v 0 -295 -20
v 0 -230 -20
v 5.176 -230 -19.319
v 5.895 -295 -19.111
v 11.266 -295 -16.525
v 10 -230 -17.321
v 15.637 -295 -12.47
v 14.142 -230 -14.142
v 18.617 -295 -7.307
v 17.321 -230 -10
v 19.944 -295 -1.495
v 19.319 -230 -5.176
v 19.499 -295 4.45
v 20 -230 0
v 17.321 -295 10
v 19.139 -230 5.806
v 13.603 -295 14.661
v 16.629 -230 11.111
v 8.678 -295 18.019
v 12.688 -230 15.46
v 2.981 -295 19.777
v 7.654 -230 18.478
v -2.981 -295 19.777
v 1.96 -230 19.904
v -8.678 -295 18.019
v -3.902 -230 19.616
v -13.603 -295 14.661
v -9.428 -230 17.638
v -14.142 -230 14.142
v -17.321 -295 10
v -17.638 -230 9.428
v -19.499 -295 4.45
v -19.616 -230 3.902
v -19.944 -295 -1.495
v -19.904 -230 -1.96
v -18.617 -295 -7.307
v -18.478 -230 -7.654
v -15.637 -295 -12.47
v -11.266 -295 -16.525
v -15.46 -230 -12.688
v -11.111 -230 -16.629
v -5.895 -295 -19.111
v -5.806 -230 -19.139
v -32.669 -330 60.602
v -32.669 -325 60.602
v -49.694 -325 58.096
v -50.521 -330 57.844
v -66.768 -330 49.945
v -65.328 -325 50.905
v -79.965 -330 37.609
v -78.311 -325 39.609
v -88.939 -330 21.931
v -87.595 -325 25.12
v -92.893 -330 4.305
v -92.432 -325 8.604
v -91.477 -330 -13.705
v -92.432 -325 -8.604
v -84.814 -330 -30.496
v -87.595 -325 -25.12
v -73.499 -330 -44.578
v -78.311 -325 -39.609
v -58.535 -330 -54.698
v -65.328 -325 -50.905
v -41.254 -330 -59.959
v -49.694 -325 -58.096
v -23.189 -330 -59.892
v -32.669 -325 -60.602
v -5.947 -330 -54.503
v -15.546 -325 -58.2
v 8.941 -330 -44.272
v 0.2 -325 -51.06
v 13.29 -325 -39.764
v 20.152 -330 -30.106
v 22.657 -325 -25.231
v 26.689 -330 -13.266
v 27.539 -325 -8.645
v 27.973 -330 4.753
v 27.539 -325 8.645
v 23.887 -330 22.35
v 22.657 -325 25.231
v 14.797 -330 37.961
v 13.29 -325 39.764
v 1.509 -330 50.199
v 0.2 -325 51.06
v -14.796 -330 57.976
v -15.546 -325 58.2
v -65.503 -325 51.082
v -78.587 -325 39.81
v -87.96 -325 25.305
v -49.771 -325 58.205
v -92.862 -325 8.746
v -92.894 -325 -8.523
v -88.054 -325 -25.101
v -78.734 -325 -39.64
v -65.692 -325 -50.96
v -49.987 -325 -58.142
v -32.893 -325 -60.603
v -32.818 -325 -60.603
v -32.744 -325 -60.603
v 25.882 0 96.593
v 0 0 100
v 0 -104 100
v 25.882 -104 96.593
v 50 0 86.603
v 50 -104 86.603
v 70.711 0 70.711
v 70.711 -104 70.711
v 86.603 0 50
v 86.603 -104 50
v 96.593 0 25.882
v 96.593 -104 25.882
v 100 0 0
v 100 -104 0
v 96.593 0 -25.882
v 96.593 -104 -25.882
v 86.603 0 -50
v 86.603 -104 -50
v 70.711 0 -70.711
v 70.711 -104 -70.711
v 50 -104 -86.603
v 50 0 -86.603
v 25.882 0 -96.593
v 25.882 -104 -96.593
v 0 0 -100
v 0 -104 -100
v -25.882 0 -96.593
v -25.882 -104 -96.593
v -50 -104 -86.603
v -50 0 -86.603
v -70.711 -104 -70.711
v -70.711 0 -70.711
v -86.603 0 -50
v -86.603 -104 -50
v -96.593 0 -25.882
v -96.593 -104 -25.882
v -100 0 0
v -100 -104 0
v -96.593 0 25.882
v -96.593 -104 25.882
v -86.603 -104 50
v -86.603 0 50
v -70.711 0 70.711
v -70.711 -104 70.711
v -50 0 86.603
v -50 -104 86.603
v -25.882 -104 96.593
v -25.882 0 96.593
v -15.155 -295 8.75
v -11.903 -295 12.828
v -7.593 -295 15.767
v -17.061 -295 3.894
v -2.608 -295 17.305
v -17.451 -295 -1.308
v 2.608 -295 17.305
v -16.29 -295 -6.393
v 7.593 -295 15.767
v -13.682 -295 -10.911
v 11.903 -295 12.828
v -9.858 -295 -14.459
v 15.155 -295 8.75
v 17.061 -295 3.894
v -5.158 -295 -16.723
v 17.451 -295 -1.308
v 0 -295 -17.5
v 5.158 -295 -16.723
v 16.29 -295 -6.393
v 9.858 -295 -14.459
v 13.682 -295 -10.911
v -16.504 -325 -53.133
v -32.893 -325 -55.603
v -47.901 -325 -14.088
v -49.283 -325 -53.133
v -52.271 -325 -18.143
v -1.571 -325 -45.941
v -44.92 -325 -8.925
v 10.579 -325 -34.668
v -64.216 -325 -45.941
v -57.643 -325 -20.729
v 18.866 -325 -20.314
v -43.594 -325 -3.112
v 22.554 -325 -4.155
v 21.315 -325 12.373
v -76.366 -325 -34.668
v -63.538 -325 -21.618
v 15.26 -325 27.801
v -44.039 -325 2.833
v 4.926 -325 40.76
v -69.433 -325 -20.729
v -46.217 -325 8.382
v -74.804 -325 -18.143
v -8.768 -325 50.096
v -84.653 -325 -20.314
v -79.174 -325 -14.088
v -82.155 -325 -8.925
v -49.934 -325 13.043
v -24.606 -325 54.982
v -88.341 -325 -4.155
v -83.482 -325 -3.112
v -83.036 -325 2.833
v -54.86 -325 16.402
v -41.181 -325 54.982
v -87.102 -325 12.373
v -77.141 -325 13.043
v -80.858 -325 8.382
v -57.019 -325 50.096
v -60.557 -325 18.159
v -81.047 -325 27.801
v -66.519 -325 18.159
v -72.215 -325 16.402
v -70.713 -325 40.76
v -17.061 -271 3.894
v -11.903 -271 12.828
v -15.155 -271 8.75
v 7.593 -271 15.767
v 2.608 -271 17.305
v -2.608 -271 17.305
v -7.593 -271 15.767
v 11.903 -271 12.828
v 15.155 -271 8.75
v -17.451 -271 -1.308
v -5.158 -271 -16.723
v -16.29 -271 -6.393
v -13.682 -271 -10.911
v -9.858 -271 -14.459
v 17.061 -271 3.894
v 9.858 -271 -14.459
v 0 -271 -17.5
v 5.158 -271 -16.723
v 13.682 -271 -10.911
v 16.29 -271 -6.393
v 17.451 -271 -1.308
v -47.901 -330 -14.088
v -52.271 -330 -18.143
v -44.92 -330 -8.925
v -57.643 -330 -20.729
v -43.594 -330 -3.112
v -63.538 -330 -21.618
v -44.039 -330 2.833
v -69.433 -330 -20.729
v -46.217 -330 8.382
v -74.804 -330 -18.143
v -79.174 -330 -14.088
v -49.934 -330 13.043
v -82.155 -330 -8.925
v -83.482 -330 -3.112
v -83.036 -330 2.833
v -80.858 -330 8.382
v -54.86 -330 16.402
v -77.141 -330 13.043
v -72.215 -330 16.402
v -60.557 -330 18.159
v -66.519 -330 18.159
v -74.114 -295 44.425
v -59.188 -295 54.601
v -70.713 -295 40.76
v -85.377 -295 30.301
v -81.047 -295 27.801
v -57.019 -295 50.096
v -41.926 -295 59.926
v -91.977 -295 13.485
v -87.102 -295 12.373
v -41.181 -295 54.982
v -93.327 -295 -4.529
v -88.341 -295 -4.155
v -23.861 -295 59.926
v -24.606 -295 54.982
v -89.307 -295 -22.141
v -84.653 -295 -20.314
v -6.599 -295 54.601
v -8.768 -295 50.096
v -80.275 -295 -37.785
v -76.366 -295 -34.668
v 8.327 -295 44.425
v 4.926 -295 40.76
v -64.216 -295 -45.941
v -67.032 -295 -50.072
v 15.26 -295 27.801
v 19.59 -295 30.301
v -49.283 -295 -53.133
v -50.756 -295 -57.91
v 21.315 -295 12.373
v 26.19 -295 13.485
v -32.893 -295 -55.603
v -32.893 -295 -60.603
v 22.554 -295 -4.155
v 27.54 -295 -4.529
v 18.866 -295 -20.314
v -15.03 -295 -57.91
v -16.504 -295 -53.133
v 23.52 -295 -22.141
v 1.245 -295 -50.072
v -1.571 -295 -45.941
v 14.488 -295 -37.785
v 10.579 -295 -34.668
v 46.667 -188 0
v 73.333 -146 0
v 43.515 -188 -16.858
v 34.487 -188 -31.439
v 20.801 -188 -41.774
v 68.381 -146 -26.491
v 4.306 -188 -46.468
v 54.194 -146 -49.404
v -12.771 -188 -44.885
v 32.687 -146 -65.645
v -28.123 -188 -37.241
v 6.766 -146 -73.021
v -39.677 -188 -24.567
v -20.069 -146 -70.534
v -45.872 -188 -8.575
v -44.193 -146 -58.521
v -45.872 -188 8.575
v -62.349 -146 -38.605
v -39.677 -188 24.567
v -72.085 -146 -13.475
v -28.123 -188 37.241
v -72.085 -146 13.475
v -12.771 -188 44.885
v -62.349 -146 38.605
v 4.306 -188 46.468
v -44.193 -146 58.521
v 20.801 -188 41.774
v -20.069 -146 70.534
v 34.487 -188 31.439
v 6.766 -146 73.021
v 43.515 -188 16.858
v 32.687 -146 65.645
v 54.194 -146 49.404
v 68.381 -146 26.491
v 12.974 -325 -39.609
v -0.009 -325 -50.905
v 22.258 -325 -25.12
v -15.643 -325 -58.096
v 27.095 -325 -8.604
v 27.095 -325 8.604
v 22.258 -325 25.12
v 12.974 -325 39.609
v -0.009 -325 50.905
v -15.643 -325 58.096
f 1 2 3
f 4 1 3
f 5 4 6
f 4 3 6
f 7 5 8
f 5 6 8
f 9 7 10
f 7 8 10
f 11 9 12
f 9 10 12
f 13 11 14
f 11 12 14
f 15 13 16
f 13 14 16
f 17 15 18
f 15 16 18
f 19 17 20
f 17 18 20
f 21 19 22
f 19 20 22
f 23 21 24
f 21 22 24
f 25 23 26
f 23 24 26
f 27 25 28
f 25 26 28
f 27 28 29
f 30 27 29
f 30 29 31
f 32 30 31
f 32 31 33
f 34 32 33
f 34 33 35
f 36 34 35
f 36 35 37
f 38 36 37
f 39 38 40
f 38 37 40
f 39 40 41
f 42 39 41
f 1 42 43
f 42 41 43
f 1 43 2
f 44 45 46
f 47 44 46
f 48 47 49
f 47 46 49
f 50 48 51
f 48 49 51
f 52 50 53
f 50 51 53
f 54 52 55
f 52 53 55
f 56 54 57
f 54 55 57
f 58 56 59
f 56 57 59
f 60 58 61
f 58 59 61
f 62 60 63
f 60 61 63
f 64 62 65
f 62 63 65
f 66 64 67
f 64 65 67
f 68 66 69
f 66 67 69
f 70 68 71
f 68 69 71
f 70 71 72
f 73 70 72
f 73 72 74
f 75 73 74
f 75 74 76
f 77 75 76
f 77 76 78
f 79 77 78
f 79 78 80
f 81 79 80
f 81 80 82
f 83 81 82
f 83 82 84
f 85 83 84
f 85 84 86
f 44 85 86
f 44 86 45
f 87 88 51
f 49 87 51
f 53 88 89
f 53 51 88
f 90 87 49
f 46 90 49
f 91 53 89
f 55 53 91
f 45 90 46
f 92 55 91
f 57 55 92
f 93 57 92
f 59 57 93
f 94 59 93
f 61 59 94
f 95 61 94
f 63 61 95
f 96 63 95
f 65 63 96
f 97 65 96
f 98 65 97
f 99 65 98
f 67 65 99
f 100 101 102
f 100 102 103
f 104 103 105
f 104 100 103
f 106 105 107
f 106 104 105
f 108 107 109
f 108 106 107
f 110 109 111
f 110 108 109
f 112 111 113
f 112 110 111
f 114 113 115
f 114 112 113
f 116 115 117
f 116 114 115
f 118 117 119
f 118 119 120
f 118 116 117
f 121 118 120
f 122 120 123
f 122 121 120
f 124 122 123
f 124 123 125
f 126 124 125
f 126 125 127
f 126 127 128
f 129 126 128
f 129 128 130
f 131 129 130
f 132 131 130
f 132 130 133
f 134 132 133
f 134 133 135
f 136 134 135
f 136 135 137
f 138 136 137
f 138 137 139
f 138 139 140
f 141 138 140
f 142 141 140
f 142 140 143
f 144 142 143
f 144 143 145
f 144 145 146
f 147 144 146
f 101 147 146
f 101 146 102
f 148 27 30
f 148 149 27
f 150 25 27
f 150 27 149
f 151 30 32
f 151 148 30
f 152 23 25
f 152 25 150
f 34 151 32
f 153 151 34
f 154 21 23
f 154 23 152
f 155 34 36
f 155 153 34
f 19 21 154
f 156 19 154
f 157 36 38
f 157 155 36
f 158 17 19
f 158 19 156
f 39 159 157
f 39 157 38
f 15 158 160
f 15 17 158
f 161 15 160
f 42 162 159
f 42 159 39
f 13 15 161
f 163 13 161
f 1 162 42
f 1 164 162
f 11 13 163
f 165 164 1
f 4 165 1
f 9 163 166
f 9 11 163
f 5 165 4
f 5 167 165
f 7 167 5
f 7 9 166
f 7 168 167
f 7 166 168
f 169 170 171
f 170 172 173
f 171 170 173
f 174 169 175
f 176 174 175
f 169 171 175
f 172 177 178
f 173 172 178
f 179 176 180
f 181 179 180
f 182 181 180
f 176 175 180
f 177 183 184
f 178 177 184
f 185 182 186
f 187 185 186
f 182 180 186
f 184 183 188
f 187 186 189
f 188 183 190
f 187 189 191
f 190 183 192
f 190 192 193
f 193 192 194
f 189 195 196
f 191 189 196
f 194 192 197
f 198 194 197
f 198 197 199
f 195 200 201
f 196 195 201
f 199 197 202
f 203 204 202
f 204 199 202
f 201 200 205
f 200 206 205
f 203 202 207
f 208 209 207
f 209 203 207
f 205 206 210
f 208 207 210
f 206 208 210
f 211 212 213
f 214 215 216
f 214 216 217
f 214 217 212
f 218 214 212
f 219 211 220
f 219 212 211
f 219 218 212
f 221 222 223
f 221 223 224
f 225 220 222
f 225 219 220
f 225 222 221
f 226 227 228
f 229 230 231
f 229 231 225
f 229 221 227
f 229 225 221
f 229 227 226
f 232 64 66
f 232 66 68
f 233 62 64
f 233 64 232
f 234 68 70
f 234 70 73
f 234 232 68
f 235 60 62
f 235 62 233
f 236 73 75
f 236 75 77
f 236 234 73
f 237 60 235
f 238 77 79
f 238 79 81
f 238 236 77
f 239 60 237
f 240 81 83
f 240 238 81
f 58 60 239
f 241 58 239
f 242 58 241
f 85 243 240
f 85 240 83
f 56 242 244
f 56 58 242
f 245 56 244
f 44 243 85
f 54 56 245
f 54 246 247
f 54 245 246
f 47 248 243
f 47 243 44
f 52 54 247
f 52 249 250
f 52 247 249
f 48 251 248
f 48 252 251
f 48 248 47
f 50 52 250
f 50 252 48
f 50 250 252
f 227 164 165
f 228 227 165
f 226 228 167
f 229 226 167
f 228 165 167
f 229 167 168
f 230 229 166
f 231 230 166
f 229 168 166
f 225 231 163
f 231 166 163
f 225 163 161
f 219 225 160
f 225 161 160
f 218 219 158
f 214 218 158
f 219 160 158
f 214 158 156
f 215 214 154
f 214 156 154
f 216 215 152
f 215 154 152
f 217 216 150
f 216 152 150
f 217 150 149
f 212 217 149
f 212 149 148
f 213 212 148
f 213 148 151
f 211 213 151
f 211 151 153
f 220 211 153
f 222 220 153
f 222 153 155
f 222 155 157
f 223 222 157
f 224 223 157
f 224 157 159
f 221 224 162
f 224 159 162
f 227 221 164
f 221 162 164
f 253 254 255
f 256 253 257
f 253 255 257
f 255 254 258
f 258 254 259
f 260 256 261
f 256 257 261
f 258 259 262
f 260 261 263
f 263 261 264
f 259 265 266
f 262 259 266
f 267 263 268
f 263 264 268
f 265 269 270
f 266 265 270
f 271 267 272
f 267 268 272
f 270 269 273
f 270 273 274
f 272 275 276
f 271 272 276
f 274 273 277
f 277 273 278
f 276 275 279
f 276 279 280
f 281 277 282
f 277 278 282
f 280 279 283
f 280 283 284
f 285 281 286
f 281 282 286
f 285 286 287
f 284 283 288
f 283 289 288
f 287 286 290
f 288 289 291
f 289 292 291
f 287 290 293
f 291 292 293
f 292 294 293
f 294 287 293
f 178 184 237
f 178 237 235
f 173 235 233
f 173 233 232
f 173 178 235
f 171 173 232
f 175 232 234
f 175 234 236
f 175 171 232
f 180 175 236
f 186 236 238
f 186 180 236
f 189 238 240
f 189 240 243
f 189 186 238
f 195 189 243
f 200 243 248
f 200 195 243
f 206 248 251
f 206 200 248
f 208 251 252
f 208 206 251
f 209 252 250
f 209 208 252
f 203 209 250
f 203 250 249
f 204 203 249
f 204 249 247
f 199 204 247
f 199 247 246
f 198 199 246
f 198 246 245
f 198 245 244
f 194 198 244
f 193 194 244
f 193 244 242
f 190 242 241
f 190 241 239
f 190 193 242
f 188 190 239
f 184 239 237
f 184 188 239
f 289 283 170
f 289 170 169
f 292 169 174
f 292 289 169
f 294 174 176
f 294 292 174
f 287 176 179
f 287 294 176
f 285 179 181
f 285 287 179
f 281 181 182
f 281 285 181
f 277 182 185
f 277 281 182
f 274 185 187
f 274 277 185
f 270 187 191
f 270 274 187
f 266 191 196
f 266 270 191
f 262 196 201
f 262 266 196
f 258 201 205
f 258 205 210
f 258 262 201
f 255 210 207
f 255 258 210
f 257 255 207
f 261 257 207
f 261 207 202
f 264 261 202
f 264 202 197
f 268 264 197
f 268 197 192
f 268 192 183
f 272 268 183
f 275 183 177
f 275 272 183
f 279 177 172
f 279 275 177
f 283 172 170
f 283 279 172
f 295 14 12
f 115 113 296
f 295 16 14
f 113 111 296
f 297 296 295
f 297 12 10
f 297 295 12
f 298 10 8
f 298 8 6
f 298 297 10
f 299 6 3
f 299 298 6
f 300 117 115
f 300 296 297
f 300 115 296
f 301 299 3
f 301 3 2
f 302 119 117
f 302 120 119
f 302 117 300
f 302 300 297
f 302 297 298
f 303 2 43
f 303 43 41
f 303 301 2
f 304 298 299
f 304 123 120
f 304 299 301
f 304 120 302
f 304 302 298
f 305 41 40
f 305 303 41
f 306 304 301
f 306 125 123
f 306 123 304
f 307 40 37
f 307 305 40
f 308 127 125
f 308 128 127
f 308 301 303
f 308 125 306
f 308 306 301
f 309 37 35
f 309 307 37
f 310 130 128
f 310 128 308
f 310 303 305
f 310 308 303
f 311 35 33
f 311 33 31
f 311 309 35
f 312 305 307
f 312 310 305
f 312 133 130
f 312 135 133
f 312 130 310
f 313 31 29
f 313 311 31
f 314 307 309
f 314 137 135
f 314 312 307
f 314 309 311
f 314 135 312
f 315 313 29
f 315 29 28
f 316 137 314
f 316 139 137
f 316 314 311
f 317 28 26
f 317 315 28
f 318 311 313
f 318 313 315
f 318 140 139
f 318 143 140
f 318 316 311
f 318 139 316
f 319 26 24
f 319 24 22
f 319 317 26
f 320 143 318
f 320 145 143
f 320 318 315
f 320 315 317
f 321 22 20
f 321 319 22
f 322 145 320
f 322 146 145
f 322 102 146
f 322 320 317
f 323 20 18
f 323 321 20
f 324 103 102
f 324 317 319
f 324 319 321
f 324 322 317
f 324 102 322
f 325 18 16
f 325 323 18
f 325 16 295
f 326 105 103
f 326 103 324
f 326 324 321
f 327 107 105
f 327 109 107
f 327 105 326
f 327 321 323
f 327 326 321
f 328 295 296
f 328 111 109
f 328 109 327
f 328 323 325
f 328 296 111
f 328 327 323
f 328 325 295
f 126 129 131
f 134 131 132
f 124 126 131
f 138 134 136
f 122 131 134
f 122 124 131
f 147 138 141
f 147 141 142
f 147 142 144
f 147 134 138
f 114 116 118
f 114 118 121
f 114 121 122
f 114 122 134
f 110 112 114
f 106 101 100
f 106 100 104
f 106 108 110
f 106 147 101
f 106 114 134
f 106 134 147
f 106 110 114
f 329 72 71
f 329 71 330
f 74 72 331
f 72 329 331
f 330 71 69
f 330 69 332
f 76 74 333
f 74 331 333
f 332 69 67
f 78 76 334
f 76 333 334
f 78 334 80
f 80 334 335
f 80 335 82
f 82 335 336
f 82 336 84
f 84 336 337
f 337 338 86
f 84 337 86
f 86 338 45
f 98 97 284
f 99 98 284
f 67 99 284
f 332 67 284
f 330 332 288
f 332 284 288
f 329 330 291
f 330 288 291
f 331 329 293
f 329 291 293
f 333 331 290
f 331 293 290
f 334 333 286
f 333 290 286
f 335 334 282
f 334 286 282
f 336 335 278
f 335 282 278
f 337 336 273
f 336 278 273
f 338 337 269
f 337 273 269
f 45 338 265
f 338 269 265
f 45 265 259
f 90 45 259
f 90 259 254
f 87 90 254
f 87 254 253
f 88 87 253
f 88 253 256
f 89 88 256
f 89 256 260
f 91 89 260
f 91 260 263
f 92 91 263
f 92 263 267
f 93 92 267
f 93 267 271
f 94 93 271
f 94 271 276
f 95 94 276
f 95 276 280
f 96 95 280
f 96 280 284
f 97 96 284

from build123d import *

# Parameters (mm, degrees)
CROQUIS1_R              = 100
SALIENTE_EXTRUIR1_DEPTH = 104
CROQUIS3_R              = 20
CROQUIS2_R              = 100
CROQUIS4_R              = 20
SALIENTE_EXTRUIR2_DEPTH = 65
CROQUIS7_R              = 17.5
CORTAR_EXTRUIR2_DEPTH   = 24
CROQUIS8_R              = 60.602826114
CROQUIS8_R_2            = 55.602826114
SALIENTE_EXTRUIR3_DEPTH = 30
CROQUIS10_R             = 60.602826114
CROQUIS10_R_2           = 20
SALIENTE_EXTRUIR5_DEPTH = 5


with BuildPart() as part:
    # Croquis1 → Saliente-Extruir1 (new body)
    with BuildSketch(Plane(origin=(0, 0, 0), x_dir=(1, 0, 0), z_dir=(0, 1, 0))):
        with Locations(Location((0, 0, 0), (0, 0, 270))):
            Circle(CROQUIS1_R)
    extrude(amount=-SALIENTE_EXTRUIR1_DEPTH)

    # Croquis3 → Recubrir1 section 0
    with BuildSketch(Plane(origin=(0, -230, 0), x_dir=(1, 0, 0), z_dir=(0, 1, 0))):
        Circle(CROQUIS3_R)
    # Croquis2 → Recubrir1 section 1
    with BuildSketch(Plane.XZ.offset(104)):
        Circle(CROQUIS2_R)
    loft()

    # Croquis4 → Saliente-Extruir2 (add)
    with BuildSketch(Plane.XZ.offset(230)):
        with Locations(Location((0, 0, 0), (0, 0, 270))):
            Circle(CROQUIS4_R)
    extrude(amount=SALIENTE_EXTRUIR2_DEPTH)

    # Croquis7 → Cortar-Extruir2 (cut)
    with BuildSketch(Plane.XZ.offset(295)):
        with Locations(Location((0, 0, 0), (0, 0, 270))):
            Circle(CROQUIS7_R)
    extrude(amount=-CORTAR_EXTRUIR2_DEPTH, mode=Mode.SUBTRACT)


with BuildPart() as body_2:
    # Croquis8 → Saliente-Extruir3 (new body)
    with BuildSketch(Plane.XZ.offset(295)):
        with Locations(Location((-32.893475565, 0, 0), (0, 0, 270))):
            Circle(CROQUIS8_R)
        with Locations(Location((-32.893475565, 0, 0), (0, 0, 270))):
            Circle(CROQUIS8_R_2, mode=Mode.SUBTRACT)
    extrude(amount=SALIENTE_EXTRUIR3_DEPTH)

    # Croquis10 → Saliente-Extruir5 (add)
    with BuildSketch(Plane.XZ.offset(325)):
        with Locations(Location((-32.443615628, 0, 0), (0, 0, 90.212656212))):
            Circle(CROQUIS10_R)
        with Locations(Location((-63.53778642, -1.617860302, 0), (0, 0, 270))):
            Circle(CROQUIS10_R_2, mode=Mode.SUBTRACT)
    extrude(amount=SALIENTE_EXTRUIR5_DEPTH)


solid = Compound([part.part, body_2.part])
